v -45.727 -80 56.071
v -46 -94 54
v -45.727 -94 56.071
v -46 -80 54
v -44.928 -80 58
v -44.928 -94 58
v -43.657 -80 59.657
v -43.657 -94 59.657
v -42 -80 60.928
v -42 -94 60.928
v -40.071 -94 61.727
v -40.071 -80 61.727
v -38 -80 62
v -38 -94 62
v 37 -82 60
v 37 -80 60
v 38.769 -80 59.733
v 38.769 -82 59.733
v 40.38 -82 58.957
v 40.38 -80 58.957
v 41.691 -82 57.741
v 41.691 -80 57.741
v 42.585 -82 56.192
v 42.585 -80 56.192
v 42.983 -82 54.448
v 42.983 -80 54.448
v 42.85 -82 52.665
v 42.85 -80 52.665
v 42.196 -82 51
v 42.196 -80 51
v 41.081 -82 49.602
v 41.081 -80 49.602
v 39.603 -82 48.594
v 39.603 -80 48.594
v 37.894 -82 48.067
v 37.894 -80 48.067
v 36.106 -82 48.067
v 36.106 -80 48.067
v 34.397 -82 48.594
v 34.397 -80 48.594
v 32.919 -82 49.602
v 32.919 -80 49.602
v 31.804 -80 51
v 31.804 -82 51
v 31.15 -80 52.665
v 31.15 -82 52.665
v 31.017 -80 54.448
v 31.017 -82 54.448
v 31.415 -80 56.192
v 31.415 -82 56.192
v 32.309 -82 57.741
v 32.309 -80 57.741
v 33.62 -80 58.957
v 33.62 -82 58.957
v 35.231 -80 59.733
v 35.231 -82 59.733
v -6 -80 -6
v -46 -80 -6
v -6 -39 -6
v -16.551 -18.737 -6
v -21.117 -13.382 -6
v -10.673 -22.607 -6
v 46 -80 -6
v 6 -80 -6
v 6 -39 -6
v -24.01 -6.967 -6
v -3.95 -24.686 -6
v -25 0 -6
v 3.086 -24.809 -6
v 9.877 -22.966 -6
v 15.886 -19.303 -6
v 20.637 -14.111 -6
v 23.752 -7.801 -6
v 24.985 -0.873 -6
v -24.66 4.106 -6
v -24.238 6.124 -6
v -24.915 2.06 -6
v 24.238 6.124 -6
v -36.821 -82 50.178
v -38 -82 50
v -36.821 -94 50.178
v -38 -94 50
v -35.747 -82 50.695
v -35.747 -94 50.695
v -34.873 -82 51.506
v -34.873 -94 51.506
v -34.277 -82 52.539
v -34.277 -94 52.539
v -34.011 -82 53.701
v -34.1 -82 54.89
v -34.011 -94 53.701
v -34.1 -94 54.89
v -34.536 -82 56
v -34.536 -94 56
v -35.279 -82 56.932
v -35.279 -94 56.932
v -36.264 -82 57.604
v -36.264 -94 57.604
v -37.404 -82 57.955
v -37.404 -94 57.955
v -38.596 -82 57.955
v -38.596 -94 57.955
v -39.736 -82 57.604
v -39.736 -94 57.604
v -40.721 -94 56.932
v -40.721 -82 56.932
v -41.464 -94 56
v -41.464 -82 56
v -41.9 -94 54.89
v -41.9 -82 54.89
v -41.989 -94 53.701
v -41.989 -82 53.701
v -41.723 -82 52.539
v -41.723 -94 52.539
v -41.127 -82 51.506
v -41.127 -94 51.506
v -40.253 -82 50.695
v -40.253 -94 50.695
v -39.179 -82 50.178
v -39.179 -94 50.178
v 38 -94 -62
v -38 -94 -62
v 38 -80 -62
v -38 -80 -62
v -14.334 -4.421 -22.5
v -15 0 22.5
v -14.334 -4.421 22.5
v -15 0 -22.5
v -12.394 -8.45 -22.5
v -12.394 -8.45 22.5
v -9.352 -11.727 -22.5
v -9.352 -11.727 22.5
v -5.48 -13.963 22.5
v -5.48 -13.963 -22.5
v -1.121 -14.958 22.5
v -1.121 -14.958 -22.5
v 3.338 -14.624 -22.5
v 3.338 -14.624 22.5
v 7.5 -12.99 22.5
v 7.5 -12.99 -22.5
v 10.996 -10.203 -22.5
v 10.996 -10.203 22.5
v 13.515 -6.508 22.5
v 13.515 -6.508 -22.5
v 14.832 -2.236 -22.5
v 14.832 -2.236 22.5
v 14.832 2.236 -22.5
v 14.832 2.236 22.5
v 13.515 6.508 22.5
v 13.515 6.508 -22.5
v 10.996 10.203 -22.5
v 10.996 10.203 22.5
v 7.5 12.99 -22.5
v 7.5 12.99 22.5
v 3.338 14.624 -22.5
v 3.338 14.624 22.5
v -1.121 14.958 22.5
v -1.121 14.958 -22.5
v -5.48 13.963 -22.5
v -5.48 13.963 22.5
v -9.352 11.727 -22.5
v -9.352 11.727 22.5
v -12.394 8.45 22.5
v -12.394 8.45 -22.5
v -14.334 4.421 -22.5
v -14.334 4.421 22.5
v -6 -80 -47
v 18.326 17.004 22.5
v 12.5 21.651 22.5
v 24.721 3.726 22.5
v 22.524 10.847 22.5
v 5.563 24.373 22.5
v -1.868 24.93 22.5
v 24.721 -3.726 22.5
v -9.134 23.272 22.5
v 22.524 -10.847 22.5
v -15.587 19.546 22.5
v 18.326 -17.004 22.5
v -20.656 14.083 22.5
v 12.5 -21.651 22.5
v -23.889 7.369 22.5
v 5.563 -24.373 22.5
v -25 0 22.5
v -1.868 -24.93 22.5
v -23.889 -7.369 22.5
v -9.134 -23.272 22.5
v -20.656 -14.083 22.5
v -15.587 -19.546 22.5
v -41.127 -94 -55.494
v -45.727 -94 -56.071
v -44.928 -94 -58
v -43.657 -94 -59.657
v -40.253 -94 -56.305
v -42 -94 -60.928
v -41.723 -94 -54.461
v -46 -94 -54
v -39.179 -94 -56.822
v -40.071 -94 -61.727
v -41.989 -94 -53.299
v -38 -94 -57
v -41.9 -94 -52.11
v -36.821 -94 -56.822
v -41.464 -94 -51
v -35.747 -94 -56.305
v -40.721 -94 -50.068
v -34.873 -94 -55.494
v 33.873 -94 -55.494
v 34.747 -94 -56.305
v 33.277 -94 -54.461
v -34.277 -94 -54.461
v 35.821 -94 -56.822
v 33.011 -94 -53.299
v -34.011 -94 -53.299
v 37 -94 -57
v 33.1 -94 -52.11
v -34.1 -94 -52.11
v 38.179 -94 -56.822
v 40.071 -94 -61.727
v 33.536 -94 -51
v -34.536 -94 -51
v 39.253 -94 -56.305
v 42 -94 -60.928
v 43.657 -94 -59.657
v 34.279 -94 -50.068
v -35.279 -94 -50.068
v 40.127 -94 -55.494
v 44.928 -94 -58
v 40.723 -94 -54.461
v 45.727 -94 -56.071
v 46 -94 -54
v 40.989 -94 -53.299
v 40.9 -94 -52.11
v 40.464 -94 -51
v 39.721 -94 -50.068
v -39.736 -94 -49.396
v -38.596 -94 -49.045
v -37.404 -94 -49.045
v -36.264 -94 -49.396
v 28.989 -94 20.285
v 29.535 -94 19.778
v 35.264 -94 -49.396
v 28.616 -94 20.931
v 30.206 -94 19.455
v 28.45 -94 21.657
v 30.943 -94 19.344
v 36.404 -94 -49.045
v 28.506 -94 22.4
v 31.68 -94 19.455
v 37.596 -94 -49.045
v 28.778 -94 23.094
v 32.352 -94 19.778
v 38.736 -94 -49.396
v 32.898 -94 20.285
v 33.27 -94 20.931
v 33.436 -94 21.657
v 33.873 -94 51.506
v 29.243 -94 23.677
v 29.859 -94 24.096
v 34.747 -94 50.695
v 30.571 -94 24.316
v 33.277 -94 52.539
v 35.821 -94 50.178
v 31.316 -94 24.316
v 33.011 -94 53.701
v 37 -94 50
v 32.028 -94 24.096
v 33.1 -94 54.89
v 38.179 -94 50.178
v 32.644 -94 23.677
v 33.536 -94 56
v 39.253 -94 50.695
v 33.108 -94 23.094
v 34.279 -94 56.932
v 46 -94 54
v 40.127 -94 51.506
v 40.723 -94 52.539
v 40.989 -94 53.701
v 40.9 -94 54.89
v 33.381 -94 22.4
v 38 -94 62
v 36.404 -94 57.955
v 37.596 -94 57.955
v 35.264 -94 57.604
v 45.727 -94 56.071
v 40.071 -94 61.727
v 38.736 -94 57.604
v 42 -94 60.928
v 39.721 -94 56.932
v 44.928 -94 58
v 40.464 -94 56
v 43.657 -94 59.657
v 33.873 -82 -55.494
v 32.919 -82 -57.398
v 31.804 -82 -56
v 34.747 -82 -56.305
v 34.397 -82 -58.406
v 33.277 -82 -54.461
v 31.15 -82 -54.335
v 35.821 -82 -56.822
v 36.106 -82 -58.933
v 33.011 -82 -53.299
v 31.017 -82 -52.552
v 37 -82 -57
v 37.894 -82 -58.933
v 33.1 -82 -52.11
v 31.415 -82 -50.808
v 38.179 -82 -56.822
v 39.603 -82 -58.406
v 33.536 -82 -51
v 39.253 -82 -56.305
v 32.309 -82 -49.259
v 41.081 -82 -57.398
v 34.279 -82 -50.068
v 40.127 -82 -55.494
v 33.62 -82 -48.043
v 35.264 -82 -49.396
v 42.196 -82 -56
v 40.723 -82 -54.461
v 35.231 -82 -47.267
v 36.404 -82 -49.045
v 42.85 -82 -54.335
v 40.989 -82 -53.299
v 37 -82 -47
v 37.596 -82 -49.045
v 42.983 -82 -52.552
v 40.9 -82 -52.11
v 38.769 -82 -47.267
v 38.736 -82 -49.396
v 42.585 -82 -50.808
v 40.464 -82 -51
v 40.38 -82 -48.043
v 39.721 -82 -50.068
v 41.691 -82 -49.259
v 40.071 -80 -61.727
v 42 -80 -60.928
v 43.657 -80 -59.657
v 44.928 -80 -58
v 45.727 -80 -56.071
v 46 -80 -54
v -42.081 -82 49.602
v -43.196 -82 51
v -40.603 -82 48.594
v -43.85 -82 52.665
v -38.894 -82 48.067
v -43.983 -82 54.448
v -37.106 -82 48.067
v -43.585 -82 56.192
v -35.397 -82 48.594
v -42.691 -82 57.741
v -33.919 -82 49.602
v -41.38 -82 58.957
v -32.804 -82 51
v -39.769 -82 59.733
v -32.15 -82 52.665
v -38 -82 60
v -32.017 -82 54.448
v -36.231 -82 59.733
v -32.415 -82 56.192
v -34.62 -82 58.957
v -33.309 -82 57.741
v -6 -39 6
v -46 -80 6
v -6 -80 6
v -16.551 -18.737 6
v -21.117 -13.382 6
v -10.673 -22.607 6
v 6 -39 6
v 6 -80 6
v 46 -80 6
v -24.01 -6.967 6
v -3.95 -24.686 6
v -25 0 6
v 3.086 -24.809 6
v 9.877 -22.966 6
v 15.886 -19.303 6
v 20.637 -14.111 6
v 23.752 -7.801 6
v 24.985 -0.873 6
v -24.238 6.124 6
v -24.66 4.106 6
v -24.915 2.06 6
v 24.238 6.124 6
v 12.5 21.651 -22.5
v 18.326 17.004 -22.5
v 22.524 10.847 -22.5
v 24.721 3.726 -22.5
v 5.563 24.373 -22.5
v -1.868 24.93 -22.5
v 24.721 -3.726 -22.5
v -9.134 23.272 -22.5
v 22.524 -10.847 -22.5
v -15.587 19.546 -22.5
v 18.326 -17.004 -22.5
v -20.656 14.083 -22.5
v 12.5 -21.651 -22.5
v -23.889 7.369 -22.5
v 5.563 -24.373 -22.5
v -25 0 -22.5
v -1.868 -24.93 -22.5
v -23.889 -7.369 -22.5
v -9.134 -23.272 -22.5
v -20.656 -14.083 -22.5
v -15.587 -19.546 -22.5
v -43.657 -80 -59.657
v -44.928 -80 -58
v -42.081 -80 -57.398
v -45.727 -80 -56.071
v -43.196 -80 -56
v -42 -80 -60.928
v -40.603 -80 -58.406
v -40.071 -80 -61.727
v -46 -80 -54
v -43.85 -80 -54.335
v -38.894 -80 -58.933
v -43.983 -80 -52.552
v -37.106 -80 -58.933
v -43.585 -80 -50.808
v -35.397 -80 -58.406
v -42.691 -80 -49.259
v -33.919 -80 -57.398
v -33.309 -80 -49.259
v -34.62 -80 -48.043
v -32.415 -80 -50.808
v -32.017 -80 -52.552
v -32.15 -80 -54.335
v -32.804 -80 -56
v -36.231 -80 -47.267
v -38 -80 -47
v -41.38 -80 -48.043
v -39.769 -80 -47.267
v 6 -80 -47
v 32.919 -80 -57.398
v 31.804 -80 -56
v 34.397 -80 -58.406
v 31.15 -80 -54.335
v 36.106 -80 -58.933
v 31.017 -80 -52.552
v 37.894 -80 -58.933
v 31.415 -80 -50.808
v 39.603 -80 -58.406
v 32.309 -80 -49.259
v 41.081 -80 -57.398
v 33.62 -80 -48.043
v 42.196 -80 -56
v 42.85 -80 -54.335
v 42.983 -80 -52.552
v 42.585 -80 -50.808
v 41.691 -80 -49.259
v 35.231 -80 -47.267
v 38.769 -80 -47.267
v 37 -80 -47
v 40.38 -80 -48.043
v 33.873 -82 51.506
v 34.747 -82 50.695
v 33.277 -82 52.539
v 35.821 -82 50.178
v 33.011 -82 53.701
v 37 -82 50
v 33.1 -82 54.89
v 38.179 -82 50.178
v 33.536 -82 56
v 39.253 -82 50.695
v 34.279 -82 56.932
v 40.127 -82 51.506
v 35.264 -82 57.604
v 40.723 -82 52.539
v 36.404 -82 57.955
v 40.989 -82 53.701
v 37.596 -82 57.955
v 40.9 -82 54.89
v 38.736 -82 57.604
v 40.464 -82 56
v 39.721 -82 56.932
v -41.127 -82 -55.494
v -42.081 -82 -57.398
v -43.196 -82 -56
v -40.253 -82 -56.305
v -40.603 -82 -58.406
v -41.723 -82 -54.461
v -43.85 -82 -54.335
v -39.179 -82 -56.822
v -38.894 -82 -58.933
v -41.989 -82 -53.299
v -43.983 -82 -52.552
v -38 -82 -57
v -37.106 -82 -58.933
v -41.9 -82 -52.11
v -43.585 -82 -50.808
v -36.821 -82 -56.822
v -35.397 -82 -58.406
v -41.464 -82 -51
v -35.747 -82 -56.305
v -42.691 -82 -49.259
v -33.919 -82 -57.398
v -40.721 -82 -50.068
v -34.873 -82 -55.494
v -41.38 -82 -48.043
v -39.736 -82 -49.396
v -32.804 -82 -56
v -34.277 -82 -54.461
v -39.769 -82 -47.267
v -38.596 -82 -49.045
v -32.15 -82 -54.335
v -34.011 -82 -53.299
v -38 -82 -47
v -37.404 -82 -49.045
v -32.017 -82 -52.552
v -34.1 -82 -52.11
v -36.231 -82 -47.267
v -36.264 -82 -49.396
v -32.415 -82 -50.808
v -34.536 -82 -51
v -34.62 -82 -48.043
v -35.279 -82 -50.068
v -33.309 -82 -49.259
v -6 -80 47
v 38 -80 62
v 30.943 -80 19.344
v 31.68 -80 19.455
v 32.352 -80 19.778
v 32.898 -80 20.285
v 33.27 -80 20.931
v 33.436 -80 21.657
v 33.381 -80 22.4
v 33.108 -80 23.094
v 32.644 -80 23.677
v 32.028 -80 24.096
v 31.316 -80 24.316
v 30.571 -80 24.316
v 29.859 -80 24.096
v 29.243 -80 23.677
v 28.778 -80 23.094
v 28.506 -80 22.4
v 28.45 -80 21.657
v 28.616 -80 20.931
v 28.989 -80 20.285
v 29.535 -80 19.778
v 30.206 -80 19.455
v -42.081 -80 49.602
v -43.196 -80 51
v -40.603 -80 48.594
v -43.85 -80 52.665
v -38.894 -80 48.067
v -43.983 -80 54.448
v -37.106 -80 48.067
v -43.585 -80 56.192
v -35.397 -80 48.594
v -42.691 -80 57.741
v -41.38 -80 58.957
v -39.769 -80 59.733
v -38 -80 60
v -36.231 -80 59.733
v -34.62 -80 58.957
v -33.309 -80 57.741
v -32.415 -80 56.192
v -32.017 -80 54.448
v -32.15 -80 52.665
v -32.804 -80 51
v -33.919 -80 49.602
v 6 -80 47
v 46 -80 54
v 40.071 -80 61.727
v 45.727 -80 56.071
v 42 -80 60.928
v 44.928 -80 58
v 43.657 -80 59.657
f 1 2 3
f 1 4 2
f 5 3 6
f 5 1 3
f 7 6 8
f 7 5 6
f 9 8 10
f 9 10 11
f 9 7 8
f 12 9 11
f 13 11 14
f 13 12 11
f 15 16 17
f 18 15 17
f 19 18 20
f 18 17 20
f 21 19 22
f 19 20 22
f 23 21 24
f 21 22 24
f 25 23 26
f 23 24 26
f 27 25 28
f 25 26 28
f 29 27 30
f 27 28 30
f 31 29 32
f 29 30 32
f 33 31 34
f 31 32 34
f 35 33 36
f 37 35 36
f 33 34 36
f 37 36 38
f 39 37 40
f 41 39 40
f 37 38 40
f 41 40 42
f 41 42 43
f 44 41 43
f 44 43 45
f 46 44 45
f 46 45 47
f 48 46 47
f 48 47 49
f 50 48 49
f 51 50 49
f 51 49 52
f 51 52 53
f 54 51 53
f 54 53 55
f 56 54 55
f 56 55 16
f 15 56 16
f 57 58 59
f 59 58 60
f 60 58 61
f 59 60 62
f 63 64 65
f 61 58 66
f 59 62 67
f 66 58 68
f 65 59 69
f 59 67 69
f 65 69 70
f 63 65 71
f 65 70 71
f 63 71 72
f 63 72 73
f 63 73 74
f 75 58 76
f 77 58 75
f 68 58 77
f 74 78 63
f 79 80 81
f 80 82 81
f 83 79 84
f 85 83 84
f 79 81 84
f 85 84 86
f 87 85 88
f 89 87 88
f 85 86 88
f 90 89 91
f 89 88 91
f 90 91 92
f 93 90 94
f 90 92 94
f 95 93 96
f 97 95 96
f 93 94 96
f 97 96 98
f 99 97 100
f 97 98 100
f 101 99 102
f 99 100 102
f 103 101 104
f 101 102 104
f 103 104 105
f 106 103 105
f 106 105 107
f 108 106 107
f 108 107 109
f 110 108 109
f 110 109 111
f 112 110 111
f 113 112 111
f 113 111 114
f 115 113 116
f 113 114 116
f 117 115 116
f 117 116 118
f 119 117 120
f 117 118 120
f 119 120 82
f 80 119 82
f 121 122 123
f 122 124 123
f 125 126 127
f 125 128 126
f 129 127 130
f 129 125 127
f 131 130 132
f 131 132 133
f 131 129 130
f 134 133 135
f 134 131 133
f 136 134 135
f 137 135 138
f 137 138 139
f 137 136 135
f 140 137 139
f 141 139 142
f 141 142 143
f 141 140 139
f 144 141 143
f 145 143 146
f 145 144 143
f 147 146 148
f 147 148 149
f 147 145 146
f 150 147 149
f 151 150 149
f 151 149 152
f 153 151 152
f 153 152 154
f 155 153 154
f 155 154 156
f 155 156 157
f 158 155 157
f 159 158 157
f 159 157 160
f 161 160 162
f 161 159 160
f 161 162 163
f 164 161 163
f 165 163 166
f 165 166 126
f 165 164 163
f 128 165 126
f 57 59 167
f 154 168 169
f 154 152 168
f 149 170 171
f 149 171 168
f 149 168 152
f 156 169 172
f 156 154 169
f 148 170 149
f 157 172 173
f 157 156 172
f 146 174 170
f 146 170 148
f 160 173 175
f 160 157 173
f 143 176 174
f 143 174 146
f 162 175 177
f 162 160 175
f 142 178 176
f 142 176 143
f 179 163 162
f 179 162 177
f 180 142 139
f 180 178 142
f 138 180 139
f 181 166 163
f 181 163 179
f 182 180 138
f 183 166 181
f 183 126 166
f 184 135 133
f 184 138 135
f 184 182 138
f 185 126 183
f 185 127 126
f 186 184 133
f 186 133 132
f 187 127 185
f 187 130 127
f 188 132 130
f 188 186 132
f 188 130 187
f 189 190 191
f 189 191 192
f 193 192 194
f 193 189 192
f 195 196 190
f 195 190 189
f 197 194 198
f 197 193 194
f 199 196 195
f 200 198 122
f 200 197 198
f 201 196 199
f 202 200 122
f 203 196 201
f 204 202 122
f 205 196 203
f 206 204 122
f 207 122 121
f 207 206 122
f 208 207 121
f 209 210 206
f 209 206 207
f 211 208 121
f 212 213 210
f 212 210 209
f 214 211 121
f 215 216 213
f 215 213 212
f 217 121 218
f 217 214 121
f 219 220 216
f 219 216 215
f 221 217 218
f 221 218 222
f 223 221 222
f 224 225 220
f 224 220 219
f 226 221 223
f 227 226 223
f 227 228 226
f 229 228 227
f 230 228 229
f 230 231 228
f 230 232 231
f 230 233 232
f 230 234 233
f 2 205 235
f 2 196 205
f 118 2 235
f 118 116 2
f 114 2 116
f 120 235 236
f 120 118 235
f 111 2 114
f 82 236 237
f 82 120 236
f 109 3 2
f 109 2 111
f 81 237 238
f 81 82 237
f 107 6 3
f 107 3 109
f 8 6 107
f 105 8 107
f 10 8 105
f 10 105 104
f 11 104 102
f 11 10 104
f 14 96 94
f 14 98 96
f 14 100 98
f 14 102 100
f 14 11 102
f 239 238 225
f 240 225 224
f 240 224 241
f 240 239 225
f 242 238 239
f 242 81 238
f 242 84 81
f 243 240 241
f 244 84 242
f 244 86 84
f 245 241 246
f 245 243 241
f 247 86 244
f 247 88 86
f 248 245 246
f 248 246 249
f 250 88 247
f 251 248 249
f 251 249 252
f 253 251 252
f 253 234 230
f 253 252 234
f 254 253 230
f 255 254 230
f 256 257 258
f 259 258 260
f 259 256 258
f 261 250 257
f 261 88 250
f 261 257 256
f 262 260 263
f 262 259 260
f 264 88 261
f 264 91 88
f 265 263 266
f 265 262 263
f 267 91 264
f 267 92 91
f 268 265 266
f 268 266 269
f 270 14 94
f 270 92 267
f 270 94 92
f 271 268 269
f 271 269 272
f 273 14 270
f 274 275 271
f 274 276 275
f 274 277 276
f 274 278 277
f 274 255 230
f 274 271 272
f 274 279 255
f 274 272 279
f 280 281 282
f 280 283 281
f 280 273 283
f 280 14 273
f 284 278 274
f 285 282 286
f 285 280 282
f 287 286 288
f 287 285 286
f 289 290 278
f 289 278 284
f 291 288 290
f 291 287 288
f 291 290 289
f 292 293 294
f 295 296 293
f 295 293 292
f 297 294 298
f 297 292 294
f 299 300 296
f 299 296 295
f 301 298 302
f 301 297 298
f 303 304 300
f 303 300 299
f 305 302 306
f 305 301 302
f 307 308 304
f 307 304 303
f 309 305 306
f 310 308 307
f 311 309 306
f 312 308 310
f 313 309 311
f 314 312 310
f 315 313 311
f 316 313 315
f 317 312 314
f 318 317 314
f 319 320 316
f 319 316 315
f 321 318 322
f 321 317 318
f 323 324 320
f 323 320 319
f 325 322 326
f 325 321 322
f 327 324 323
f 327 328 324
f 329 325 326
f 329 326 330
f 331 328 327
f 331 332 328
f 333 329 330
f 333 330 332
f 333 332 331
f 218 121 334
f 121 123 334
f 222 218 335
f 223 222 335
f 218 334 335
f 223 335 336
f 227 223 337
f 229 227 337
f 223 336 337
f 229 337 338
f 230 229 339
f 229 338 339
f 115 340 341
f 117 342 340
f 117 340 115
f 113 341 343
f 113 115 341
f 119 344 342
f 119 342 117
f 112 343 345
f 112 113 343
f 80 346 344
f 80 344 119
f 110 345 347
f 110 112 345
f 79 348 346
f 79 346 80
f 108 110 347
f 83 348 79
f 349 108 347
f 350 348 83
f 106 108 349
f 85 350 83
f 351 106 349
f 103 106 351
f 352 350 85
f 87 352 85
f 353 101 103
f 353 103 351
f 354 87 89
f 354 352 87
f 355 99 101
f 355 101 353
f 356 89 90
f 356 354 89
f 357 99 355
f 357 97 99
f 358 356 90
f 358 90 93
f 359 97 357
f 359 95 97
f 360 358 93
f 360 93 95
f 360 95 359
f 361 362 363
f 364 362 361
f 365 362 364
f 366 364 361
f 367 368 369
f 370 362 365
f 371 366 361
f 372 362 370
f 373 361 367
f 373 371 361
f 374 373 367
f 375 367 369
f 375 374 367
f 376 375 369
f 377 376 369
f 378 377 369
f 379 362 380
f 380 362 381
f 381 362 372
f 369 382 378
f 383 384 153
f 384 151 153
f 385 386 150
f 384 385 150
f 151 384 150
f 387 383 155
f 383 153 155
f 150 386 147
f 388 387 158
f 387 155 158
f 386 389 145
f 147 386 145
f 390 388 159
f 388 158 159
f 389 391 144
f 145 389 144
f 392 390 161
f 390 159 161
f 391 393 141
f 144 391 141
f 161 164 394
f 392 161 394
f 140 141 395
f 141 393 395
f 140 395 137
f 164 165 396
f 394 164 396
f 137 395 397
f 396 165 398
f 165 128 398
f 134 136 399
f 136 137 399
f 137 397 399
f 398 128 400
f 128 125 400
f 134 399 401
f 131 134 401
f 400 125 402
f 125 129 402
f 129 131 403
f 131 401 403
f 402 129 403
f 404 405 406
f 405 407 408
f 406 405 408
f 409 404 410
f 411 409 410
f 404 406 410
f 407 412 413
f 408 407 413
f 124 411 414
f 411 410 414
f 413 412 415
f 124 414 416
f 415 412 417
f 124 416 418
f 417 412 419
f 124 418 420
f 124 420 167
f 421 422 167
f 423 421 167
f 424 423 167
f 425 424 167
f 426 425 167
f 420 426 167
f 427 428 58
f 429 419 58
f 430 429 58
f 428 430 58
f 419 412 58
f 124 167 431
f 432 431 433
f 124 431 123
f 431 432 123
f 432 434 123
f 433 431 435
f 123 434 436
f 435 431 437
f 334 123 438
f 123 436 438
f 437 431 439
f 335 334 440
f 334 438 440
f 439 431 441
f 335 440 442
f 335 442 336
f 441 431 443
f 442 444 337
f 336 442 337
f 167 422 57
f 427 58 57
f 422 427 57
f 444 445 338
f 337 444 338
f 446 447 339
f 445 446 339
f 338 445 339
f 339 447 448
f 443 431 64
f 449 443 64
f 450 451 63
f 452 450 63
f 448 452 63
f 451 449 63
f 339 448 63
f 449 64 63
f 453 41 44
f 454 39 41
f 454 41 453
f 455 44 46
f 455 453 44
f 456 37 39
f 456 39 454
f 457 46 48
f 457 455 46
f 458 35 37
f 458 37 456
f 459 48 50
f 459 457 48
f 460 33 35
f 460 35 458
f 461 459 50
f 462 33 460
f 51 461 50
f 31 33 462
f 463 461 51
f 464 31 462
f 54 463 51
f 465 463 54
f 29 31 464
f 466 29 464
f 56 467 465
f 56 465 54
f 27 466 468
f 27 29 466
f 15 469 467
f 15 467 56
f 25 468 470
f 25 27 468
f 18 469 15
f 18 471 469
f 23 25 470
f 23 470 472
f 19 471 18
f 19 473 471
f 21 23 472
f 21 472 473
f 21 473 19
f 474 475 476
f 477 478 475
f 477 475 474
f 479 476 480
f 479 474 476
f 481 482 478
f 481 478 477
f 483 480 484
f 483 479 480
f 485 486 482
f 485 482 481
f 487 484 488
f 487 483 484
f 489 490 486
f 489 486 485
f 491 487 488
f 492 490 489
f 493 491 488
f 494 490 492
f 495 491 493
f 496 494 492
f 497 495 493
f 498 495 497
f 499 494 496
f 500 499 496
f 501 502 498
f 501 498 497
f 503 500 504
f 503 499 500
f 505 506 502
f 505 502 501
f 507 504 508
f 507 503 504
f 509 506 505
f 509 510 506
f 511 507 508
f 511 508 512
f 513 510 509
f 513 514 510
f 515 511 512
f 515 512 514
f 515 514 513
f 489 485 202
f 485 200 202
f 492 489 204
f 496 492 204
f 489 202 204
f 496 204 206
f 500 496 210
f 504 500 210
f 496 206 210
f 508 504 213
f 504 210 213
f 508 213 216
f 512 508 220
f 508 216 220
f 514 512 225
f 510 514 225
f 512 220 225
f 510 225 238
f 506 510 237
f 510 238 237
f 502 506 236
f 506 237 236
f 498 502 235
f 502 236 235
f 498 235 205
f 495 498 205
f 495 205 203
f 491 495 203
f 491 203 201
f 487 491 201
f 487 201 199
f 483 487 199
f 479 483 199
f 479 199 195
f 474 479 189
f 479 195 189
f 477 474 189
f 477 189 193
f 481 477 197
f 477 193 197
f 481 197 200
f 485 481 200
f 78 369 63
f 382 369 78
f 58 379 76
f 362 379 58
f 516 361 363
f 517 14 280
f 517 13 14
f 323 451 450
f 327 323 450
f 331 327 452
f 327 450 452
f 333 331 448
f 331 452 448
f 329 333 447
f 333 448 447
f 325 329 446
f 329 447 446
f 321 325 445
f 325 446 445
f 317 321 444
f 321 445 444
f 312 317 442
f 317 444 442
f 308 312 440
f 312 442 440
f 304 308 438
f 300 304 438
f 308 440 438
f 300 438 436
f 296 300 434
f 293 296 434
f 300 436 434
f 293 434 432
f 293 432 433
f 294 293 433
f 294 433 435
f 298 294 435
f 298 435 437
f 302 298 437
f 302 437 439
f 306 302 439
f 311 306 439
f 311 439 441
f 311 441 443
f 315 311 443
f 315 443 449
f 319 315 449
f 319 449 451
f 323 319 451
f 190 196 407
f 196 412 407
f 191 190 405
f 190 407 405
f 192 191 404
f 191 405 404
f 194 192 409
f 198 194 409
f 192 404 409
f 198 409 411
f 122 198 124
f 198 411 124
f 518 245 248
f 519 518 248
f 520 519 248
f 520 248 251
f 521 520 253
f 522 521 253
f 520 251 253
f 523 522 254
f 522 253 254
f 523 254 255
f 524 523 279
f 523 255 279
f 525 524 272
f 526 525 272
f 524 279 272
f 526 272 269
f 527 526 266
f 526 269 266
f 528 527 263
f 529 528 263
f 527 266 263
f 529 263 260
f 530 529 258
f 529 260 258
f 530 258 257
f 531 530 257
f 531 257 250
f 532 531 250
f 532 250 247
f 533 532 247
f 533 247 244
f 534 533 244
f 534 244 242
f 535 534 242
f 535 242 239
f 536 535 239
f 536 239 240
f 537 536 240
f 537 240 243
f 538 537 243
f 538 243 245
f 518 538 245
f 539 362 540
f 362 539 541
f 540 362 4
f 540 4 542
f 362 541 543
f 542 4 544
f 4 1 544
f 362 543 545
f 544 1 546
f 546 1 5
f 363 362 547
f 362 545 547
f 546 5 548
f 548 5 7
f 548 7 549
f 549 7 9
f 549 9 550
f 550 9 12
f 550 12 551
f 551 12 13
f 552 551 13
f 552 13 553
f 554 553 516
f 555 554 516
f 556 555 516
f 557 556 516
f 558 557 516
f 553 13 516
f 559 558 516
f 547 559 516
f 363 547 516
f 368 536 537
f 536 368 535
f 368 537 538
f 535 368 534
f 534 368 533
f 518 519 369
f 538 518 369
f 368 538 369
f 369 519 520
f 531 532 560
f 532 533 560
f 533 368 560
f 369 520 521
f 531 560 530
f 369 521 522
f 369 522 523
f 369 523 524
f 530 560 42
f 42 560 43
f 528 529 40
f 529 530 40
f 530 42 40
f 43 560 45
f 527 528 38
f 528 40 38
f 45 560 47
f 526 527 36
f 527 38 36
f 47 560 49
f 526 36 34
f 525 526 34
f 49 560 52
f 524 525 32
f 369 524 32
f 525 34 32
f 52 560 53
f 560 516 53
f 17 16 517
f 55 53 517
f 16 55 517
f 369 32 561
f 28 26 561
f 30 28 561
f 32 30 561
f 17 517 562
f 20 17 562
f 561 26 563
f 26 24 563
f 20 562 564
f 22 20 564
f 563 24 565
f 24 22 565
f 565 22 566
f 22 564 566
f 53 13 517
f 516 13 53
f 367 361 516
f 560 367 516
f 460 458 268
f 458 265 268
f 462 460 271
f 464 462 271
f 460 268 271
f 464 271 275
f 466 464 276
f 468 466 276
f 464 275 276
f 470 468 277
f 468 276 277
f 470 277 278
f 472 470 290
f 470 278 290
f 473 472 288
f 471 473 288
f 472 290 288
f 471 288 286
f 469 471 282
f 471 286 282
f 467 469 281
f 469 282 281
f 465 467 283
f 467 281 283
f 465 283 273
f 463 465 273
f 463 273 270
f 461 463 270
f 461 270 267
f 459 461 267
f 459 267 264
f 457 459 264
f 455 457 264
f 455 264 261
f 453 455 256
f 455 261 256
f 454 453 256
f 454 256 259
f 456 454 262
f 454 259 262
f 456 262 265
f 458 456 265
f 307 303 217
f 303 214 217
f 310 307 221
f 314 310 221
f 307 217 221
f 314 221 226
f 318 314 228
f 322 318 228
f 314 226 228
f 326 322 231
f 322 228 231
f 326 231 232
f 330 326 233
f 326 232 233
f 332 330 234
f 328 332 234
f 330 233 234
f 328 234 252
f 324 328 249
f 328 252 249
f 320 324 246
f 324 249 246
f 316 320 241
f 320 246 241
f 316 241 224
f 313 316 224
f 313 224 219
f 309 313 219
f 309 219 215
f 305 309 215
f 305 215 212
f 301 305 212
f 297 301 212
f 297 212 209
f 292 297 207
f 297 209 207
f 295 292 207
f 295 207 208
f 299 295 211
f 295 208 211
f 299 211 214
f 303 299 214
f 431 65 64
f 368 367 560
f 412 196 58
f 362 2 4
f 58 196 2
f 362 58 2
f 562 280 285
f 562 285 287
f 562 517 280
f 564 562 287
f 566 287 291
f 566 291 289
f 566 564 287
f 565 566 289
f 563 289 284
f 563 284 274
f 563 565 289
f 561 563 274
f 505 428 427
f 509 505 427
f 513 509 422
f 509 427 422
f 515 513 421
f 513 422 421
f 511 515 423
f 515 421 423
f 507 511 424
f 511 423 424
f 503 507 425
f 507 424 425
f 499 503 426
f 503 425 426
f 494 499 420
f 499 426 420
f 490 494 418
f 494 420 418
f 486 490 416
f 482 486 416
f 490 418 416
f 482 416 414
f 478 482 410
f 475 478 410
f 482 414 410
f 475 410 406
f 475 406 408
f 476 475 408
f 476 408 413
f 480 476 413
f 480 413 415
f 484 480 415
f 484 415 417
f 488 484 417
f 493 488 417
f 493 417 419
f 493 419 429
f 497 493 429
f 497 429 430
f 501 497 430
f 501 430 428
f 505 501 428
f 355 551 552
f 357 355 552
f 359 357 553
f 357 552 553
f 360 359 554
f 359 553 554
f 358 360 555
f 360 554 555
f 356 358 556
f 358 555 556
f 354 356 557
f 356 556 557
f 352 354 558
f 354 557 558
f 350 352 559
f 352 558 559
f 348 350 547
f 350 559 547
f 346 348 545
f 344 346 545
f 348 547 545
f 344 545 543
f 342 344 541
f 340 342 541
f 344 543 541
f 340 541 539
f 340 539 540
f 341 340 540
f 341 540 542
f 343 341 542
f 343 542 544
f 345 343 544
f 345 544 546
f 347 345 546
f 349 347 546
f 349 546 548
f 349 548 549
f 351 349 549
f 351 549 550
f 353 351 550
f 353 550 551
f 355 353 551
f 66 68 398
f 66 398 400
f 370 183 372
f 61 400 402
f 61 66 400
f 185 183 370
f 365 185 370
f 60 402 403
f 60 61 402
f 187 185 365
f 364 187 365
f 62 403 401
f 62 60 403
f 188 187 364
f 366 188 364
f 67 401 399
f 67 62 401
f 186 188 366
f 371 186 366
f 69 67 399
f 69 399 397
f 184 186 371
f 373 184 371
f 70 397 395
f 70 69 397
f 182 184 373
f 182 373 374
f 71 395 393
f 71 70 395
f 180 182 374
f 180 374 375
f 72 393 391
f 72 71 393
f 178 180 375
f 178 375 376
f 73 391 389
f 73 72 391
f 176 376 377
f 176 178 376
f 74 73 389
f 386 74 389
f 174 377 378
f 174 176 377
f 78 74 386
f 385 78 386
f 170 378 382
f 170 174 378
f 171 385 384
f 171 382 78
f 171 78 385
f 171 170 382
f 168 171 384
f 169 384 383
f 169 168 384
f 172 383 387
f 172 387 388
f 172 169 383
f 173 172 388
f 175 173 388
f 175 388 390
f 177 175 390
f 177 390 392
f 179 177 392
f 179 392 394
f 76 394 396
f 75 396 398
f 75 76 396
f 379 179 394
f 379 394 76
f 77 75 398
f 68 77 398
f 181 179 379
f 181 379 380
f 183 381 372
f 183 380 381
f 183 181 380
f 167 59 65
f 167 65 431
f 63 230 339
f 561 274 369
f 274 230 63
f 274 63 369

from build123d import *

# Parameters (mm, degrees)
SKETCH_1_R                   = 25
SKETCH_1_R_2                 = 15
EXTRUDE_1_DEPTH              = 22.5
SKETCH_2_W                   = 92
SKETCH_2_H                   = 14
EXTRUDE_2_DEPTH              = 62
EXTRUDE_3_DEPTH              = 6
RIB_1_REACH                  = 123.639
SKETCH_4_WALL_W              = 303.26037525
SKETCH_4_WALL_H              = 12
FILLET_1_R                   = 8
HOLE_WIZARD_M5_1_D           = 8
HOLE_WIZARD_M5_1_CBORE_D     = 12
HOLE_WIZARD_M5_1_CBORE_DEPTH = 2
HOLE_WIZARD_M6_1_D           = 5
PATTERN_LINEAR_7_COUNT       = 2
PATTERN_LINEAR_7_PITCH       = 75
PATTERN_LINEAR_7_COUNT_DIR2  = 2
PATTERN_LINEAR_7_PITCH_DIR2  = 107


with BuildPart() as part:
    # 스케치1 → 보스-돌출1 (new, symmetric)
    with BuildSketch(Plane.XY):
        with Locations(Location((0, 0, 0), (0, 0, 180))):
            Circle(SKETCH_1_R)
        with Locations(Location((0, 0, 0), (0, 0, 180))):
            Circle(SKETCH_1_R_2, mode=Mode.SUBTRACT)
    extrude(amount=EXTRUDE_1_DEPTH, both=True)



with BuildPart() as body_2:
    # 스케치2 → 보스-돌출2 (new, symmetric)
    with BuildSketch(Plane.XY):
        with Locations((0, -87)):
            Rectangle(SKETCH_2_W, SKETCH_2_H)
    extrude(amount=EXTRUDE_2_DEPTH, both=True)


with BuildPart() as part_1:
    add(part.part)

    add(body_2.part)  # 보스-돌출3 merges body 2
    # 스케치3 → 보스-돌출3 (add, symmetric)
    with BuildSketch(Plane.XY):
        with BuildLine():
            Line((-24.238210613, 6.124471102), (-46, -80))
            Line((-46, -80), (46, -80))
            Line((46, -80), (24.238210613, 6.124471102))
            ThreePointArc((24.238210613, 6.124471102), (0, -25), (-24.238210613, 6.124471102))
        make_face()
    extrude(amount=EXTRUDE_3_DEPTH, both=True)

    # 스케치4 wall → 보강대1 (add, up to next)
    with BuildSketch(Plane(origin=(0, -59.5, 26.5), x_dir=(0, -0.707106781187, 0.707106781187), z_dir=(0, -0.707106781187, -0.707106781187)), mode=Mode.PRIVATE) as rib_1_sk1:
        Rectangle(SKETCH_4_WALL_W, SKETCH_4_WALL_H)
    rib_1_tool1 = extrude(rib_1_sk1.sketch, amount=RIB_1_REACH, mode=Mode.PRIVATE) - part_1.part
    rib_1 = rib_1_tool1.solids().sort_by_distance((0, -59.5, 26.5))[0]
    add(rib_1)

    # 대칭 복사1: 보강대1 across plane
    add(rib_1.mirror(Plane.XY))

    # 필렛1
    fillet_1_edges = [part_1.edges().sort_by_distance(p)[0] for p in [
        (-46, -87, -62),
        (46, -87, 62),
        (46, -87, -62),
        (-46, -87, 62),
    ]]
    fillet(fillet_1_edges, radius=FILLET_1_R)

    # M5 소켓 머리 캡 나사용 카운터보어1 (through all)
    with Locations(Plane(origin=(-38, -80, 54), x_dir=(0, 0, 1), z_dir=(0, 1, 0))):
        with Locations((0, 0)):
            hole_wizard_m5_1 = CounterBoreHole(HOLE_WIZARD_M5_1_D / 2, HOLE_WIZARD_M5_1_CBORE_D / 2, HOLE_WIZARD_M5_1_CBORE_DEPTH)

    # M6 나사 구멍1 (through all)
    with Locations(Plane(origin=(30.943238256, -80, 21.843950173), x_dir=(0, 0, 1), z_dir=(0, 1, 0))):
        with Locations((0, 0)):
            Hole(HOLE_WIZARD_M6_1_D / 2)

    # 선형 패턴7: Hole Wizard M5 _ _ _ _ _1 2 × 2
    with Locations(*[(i * PATTERN_LINEAR_7_PITCH, 0, -j * PATTERN_LINEAR_7_PITCH_DIR2) for i in range(PATTERN_LINEAR_7_COUNT) for j in range(PATTERN_LINEAR_7_COUNT_DIR2) if (i, j) != (0, 0)]):
        add(hole_wizard_m5_1, mode=Mode.SUBTRACT)


solid = part_1.part
